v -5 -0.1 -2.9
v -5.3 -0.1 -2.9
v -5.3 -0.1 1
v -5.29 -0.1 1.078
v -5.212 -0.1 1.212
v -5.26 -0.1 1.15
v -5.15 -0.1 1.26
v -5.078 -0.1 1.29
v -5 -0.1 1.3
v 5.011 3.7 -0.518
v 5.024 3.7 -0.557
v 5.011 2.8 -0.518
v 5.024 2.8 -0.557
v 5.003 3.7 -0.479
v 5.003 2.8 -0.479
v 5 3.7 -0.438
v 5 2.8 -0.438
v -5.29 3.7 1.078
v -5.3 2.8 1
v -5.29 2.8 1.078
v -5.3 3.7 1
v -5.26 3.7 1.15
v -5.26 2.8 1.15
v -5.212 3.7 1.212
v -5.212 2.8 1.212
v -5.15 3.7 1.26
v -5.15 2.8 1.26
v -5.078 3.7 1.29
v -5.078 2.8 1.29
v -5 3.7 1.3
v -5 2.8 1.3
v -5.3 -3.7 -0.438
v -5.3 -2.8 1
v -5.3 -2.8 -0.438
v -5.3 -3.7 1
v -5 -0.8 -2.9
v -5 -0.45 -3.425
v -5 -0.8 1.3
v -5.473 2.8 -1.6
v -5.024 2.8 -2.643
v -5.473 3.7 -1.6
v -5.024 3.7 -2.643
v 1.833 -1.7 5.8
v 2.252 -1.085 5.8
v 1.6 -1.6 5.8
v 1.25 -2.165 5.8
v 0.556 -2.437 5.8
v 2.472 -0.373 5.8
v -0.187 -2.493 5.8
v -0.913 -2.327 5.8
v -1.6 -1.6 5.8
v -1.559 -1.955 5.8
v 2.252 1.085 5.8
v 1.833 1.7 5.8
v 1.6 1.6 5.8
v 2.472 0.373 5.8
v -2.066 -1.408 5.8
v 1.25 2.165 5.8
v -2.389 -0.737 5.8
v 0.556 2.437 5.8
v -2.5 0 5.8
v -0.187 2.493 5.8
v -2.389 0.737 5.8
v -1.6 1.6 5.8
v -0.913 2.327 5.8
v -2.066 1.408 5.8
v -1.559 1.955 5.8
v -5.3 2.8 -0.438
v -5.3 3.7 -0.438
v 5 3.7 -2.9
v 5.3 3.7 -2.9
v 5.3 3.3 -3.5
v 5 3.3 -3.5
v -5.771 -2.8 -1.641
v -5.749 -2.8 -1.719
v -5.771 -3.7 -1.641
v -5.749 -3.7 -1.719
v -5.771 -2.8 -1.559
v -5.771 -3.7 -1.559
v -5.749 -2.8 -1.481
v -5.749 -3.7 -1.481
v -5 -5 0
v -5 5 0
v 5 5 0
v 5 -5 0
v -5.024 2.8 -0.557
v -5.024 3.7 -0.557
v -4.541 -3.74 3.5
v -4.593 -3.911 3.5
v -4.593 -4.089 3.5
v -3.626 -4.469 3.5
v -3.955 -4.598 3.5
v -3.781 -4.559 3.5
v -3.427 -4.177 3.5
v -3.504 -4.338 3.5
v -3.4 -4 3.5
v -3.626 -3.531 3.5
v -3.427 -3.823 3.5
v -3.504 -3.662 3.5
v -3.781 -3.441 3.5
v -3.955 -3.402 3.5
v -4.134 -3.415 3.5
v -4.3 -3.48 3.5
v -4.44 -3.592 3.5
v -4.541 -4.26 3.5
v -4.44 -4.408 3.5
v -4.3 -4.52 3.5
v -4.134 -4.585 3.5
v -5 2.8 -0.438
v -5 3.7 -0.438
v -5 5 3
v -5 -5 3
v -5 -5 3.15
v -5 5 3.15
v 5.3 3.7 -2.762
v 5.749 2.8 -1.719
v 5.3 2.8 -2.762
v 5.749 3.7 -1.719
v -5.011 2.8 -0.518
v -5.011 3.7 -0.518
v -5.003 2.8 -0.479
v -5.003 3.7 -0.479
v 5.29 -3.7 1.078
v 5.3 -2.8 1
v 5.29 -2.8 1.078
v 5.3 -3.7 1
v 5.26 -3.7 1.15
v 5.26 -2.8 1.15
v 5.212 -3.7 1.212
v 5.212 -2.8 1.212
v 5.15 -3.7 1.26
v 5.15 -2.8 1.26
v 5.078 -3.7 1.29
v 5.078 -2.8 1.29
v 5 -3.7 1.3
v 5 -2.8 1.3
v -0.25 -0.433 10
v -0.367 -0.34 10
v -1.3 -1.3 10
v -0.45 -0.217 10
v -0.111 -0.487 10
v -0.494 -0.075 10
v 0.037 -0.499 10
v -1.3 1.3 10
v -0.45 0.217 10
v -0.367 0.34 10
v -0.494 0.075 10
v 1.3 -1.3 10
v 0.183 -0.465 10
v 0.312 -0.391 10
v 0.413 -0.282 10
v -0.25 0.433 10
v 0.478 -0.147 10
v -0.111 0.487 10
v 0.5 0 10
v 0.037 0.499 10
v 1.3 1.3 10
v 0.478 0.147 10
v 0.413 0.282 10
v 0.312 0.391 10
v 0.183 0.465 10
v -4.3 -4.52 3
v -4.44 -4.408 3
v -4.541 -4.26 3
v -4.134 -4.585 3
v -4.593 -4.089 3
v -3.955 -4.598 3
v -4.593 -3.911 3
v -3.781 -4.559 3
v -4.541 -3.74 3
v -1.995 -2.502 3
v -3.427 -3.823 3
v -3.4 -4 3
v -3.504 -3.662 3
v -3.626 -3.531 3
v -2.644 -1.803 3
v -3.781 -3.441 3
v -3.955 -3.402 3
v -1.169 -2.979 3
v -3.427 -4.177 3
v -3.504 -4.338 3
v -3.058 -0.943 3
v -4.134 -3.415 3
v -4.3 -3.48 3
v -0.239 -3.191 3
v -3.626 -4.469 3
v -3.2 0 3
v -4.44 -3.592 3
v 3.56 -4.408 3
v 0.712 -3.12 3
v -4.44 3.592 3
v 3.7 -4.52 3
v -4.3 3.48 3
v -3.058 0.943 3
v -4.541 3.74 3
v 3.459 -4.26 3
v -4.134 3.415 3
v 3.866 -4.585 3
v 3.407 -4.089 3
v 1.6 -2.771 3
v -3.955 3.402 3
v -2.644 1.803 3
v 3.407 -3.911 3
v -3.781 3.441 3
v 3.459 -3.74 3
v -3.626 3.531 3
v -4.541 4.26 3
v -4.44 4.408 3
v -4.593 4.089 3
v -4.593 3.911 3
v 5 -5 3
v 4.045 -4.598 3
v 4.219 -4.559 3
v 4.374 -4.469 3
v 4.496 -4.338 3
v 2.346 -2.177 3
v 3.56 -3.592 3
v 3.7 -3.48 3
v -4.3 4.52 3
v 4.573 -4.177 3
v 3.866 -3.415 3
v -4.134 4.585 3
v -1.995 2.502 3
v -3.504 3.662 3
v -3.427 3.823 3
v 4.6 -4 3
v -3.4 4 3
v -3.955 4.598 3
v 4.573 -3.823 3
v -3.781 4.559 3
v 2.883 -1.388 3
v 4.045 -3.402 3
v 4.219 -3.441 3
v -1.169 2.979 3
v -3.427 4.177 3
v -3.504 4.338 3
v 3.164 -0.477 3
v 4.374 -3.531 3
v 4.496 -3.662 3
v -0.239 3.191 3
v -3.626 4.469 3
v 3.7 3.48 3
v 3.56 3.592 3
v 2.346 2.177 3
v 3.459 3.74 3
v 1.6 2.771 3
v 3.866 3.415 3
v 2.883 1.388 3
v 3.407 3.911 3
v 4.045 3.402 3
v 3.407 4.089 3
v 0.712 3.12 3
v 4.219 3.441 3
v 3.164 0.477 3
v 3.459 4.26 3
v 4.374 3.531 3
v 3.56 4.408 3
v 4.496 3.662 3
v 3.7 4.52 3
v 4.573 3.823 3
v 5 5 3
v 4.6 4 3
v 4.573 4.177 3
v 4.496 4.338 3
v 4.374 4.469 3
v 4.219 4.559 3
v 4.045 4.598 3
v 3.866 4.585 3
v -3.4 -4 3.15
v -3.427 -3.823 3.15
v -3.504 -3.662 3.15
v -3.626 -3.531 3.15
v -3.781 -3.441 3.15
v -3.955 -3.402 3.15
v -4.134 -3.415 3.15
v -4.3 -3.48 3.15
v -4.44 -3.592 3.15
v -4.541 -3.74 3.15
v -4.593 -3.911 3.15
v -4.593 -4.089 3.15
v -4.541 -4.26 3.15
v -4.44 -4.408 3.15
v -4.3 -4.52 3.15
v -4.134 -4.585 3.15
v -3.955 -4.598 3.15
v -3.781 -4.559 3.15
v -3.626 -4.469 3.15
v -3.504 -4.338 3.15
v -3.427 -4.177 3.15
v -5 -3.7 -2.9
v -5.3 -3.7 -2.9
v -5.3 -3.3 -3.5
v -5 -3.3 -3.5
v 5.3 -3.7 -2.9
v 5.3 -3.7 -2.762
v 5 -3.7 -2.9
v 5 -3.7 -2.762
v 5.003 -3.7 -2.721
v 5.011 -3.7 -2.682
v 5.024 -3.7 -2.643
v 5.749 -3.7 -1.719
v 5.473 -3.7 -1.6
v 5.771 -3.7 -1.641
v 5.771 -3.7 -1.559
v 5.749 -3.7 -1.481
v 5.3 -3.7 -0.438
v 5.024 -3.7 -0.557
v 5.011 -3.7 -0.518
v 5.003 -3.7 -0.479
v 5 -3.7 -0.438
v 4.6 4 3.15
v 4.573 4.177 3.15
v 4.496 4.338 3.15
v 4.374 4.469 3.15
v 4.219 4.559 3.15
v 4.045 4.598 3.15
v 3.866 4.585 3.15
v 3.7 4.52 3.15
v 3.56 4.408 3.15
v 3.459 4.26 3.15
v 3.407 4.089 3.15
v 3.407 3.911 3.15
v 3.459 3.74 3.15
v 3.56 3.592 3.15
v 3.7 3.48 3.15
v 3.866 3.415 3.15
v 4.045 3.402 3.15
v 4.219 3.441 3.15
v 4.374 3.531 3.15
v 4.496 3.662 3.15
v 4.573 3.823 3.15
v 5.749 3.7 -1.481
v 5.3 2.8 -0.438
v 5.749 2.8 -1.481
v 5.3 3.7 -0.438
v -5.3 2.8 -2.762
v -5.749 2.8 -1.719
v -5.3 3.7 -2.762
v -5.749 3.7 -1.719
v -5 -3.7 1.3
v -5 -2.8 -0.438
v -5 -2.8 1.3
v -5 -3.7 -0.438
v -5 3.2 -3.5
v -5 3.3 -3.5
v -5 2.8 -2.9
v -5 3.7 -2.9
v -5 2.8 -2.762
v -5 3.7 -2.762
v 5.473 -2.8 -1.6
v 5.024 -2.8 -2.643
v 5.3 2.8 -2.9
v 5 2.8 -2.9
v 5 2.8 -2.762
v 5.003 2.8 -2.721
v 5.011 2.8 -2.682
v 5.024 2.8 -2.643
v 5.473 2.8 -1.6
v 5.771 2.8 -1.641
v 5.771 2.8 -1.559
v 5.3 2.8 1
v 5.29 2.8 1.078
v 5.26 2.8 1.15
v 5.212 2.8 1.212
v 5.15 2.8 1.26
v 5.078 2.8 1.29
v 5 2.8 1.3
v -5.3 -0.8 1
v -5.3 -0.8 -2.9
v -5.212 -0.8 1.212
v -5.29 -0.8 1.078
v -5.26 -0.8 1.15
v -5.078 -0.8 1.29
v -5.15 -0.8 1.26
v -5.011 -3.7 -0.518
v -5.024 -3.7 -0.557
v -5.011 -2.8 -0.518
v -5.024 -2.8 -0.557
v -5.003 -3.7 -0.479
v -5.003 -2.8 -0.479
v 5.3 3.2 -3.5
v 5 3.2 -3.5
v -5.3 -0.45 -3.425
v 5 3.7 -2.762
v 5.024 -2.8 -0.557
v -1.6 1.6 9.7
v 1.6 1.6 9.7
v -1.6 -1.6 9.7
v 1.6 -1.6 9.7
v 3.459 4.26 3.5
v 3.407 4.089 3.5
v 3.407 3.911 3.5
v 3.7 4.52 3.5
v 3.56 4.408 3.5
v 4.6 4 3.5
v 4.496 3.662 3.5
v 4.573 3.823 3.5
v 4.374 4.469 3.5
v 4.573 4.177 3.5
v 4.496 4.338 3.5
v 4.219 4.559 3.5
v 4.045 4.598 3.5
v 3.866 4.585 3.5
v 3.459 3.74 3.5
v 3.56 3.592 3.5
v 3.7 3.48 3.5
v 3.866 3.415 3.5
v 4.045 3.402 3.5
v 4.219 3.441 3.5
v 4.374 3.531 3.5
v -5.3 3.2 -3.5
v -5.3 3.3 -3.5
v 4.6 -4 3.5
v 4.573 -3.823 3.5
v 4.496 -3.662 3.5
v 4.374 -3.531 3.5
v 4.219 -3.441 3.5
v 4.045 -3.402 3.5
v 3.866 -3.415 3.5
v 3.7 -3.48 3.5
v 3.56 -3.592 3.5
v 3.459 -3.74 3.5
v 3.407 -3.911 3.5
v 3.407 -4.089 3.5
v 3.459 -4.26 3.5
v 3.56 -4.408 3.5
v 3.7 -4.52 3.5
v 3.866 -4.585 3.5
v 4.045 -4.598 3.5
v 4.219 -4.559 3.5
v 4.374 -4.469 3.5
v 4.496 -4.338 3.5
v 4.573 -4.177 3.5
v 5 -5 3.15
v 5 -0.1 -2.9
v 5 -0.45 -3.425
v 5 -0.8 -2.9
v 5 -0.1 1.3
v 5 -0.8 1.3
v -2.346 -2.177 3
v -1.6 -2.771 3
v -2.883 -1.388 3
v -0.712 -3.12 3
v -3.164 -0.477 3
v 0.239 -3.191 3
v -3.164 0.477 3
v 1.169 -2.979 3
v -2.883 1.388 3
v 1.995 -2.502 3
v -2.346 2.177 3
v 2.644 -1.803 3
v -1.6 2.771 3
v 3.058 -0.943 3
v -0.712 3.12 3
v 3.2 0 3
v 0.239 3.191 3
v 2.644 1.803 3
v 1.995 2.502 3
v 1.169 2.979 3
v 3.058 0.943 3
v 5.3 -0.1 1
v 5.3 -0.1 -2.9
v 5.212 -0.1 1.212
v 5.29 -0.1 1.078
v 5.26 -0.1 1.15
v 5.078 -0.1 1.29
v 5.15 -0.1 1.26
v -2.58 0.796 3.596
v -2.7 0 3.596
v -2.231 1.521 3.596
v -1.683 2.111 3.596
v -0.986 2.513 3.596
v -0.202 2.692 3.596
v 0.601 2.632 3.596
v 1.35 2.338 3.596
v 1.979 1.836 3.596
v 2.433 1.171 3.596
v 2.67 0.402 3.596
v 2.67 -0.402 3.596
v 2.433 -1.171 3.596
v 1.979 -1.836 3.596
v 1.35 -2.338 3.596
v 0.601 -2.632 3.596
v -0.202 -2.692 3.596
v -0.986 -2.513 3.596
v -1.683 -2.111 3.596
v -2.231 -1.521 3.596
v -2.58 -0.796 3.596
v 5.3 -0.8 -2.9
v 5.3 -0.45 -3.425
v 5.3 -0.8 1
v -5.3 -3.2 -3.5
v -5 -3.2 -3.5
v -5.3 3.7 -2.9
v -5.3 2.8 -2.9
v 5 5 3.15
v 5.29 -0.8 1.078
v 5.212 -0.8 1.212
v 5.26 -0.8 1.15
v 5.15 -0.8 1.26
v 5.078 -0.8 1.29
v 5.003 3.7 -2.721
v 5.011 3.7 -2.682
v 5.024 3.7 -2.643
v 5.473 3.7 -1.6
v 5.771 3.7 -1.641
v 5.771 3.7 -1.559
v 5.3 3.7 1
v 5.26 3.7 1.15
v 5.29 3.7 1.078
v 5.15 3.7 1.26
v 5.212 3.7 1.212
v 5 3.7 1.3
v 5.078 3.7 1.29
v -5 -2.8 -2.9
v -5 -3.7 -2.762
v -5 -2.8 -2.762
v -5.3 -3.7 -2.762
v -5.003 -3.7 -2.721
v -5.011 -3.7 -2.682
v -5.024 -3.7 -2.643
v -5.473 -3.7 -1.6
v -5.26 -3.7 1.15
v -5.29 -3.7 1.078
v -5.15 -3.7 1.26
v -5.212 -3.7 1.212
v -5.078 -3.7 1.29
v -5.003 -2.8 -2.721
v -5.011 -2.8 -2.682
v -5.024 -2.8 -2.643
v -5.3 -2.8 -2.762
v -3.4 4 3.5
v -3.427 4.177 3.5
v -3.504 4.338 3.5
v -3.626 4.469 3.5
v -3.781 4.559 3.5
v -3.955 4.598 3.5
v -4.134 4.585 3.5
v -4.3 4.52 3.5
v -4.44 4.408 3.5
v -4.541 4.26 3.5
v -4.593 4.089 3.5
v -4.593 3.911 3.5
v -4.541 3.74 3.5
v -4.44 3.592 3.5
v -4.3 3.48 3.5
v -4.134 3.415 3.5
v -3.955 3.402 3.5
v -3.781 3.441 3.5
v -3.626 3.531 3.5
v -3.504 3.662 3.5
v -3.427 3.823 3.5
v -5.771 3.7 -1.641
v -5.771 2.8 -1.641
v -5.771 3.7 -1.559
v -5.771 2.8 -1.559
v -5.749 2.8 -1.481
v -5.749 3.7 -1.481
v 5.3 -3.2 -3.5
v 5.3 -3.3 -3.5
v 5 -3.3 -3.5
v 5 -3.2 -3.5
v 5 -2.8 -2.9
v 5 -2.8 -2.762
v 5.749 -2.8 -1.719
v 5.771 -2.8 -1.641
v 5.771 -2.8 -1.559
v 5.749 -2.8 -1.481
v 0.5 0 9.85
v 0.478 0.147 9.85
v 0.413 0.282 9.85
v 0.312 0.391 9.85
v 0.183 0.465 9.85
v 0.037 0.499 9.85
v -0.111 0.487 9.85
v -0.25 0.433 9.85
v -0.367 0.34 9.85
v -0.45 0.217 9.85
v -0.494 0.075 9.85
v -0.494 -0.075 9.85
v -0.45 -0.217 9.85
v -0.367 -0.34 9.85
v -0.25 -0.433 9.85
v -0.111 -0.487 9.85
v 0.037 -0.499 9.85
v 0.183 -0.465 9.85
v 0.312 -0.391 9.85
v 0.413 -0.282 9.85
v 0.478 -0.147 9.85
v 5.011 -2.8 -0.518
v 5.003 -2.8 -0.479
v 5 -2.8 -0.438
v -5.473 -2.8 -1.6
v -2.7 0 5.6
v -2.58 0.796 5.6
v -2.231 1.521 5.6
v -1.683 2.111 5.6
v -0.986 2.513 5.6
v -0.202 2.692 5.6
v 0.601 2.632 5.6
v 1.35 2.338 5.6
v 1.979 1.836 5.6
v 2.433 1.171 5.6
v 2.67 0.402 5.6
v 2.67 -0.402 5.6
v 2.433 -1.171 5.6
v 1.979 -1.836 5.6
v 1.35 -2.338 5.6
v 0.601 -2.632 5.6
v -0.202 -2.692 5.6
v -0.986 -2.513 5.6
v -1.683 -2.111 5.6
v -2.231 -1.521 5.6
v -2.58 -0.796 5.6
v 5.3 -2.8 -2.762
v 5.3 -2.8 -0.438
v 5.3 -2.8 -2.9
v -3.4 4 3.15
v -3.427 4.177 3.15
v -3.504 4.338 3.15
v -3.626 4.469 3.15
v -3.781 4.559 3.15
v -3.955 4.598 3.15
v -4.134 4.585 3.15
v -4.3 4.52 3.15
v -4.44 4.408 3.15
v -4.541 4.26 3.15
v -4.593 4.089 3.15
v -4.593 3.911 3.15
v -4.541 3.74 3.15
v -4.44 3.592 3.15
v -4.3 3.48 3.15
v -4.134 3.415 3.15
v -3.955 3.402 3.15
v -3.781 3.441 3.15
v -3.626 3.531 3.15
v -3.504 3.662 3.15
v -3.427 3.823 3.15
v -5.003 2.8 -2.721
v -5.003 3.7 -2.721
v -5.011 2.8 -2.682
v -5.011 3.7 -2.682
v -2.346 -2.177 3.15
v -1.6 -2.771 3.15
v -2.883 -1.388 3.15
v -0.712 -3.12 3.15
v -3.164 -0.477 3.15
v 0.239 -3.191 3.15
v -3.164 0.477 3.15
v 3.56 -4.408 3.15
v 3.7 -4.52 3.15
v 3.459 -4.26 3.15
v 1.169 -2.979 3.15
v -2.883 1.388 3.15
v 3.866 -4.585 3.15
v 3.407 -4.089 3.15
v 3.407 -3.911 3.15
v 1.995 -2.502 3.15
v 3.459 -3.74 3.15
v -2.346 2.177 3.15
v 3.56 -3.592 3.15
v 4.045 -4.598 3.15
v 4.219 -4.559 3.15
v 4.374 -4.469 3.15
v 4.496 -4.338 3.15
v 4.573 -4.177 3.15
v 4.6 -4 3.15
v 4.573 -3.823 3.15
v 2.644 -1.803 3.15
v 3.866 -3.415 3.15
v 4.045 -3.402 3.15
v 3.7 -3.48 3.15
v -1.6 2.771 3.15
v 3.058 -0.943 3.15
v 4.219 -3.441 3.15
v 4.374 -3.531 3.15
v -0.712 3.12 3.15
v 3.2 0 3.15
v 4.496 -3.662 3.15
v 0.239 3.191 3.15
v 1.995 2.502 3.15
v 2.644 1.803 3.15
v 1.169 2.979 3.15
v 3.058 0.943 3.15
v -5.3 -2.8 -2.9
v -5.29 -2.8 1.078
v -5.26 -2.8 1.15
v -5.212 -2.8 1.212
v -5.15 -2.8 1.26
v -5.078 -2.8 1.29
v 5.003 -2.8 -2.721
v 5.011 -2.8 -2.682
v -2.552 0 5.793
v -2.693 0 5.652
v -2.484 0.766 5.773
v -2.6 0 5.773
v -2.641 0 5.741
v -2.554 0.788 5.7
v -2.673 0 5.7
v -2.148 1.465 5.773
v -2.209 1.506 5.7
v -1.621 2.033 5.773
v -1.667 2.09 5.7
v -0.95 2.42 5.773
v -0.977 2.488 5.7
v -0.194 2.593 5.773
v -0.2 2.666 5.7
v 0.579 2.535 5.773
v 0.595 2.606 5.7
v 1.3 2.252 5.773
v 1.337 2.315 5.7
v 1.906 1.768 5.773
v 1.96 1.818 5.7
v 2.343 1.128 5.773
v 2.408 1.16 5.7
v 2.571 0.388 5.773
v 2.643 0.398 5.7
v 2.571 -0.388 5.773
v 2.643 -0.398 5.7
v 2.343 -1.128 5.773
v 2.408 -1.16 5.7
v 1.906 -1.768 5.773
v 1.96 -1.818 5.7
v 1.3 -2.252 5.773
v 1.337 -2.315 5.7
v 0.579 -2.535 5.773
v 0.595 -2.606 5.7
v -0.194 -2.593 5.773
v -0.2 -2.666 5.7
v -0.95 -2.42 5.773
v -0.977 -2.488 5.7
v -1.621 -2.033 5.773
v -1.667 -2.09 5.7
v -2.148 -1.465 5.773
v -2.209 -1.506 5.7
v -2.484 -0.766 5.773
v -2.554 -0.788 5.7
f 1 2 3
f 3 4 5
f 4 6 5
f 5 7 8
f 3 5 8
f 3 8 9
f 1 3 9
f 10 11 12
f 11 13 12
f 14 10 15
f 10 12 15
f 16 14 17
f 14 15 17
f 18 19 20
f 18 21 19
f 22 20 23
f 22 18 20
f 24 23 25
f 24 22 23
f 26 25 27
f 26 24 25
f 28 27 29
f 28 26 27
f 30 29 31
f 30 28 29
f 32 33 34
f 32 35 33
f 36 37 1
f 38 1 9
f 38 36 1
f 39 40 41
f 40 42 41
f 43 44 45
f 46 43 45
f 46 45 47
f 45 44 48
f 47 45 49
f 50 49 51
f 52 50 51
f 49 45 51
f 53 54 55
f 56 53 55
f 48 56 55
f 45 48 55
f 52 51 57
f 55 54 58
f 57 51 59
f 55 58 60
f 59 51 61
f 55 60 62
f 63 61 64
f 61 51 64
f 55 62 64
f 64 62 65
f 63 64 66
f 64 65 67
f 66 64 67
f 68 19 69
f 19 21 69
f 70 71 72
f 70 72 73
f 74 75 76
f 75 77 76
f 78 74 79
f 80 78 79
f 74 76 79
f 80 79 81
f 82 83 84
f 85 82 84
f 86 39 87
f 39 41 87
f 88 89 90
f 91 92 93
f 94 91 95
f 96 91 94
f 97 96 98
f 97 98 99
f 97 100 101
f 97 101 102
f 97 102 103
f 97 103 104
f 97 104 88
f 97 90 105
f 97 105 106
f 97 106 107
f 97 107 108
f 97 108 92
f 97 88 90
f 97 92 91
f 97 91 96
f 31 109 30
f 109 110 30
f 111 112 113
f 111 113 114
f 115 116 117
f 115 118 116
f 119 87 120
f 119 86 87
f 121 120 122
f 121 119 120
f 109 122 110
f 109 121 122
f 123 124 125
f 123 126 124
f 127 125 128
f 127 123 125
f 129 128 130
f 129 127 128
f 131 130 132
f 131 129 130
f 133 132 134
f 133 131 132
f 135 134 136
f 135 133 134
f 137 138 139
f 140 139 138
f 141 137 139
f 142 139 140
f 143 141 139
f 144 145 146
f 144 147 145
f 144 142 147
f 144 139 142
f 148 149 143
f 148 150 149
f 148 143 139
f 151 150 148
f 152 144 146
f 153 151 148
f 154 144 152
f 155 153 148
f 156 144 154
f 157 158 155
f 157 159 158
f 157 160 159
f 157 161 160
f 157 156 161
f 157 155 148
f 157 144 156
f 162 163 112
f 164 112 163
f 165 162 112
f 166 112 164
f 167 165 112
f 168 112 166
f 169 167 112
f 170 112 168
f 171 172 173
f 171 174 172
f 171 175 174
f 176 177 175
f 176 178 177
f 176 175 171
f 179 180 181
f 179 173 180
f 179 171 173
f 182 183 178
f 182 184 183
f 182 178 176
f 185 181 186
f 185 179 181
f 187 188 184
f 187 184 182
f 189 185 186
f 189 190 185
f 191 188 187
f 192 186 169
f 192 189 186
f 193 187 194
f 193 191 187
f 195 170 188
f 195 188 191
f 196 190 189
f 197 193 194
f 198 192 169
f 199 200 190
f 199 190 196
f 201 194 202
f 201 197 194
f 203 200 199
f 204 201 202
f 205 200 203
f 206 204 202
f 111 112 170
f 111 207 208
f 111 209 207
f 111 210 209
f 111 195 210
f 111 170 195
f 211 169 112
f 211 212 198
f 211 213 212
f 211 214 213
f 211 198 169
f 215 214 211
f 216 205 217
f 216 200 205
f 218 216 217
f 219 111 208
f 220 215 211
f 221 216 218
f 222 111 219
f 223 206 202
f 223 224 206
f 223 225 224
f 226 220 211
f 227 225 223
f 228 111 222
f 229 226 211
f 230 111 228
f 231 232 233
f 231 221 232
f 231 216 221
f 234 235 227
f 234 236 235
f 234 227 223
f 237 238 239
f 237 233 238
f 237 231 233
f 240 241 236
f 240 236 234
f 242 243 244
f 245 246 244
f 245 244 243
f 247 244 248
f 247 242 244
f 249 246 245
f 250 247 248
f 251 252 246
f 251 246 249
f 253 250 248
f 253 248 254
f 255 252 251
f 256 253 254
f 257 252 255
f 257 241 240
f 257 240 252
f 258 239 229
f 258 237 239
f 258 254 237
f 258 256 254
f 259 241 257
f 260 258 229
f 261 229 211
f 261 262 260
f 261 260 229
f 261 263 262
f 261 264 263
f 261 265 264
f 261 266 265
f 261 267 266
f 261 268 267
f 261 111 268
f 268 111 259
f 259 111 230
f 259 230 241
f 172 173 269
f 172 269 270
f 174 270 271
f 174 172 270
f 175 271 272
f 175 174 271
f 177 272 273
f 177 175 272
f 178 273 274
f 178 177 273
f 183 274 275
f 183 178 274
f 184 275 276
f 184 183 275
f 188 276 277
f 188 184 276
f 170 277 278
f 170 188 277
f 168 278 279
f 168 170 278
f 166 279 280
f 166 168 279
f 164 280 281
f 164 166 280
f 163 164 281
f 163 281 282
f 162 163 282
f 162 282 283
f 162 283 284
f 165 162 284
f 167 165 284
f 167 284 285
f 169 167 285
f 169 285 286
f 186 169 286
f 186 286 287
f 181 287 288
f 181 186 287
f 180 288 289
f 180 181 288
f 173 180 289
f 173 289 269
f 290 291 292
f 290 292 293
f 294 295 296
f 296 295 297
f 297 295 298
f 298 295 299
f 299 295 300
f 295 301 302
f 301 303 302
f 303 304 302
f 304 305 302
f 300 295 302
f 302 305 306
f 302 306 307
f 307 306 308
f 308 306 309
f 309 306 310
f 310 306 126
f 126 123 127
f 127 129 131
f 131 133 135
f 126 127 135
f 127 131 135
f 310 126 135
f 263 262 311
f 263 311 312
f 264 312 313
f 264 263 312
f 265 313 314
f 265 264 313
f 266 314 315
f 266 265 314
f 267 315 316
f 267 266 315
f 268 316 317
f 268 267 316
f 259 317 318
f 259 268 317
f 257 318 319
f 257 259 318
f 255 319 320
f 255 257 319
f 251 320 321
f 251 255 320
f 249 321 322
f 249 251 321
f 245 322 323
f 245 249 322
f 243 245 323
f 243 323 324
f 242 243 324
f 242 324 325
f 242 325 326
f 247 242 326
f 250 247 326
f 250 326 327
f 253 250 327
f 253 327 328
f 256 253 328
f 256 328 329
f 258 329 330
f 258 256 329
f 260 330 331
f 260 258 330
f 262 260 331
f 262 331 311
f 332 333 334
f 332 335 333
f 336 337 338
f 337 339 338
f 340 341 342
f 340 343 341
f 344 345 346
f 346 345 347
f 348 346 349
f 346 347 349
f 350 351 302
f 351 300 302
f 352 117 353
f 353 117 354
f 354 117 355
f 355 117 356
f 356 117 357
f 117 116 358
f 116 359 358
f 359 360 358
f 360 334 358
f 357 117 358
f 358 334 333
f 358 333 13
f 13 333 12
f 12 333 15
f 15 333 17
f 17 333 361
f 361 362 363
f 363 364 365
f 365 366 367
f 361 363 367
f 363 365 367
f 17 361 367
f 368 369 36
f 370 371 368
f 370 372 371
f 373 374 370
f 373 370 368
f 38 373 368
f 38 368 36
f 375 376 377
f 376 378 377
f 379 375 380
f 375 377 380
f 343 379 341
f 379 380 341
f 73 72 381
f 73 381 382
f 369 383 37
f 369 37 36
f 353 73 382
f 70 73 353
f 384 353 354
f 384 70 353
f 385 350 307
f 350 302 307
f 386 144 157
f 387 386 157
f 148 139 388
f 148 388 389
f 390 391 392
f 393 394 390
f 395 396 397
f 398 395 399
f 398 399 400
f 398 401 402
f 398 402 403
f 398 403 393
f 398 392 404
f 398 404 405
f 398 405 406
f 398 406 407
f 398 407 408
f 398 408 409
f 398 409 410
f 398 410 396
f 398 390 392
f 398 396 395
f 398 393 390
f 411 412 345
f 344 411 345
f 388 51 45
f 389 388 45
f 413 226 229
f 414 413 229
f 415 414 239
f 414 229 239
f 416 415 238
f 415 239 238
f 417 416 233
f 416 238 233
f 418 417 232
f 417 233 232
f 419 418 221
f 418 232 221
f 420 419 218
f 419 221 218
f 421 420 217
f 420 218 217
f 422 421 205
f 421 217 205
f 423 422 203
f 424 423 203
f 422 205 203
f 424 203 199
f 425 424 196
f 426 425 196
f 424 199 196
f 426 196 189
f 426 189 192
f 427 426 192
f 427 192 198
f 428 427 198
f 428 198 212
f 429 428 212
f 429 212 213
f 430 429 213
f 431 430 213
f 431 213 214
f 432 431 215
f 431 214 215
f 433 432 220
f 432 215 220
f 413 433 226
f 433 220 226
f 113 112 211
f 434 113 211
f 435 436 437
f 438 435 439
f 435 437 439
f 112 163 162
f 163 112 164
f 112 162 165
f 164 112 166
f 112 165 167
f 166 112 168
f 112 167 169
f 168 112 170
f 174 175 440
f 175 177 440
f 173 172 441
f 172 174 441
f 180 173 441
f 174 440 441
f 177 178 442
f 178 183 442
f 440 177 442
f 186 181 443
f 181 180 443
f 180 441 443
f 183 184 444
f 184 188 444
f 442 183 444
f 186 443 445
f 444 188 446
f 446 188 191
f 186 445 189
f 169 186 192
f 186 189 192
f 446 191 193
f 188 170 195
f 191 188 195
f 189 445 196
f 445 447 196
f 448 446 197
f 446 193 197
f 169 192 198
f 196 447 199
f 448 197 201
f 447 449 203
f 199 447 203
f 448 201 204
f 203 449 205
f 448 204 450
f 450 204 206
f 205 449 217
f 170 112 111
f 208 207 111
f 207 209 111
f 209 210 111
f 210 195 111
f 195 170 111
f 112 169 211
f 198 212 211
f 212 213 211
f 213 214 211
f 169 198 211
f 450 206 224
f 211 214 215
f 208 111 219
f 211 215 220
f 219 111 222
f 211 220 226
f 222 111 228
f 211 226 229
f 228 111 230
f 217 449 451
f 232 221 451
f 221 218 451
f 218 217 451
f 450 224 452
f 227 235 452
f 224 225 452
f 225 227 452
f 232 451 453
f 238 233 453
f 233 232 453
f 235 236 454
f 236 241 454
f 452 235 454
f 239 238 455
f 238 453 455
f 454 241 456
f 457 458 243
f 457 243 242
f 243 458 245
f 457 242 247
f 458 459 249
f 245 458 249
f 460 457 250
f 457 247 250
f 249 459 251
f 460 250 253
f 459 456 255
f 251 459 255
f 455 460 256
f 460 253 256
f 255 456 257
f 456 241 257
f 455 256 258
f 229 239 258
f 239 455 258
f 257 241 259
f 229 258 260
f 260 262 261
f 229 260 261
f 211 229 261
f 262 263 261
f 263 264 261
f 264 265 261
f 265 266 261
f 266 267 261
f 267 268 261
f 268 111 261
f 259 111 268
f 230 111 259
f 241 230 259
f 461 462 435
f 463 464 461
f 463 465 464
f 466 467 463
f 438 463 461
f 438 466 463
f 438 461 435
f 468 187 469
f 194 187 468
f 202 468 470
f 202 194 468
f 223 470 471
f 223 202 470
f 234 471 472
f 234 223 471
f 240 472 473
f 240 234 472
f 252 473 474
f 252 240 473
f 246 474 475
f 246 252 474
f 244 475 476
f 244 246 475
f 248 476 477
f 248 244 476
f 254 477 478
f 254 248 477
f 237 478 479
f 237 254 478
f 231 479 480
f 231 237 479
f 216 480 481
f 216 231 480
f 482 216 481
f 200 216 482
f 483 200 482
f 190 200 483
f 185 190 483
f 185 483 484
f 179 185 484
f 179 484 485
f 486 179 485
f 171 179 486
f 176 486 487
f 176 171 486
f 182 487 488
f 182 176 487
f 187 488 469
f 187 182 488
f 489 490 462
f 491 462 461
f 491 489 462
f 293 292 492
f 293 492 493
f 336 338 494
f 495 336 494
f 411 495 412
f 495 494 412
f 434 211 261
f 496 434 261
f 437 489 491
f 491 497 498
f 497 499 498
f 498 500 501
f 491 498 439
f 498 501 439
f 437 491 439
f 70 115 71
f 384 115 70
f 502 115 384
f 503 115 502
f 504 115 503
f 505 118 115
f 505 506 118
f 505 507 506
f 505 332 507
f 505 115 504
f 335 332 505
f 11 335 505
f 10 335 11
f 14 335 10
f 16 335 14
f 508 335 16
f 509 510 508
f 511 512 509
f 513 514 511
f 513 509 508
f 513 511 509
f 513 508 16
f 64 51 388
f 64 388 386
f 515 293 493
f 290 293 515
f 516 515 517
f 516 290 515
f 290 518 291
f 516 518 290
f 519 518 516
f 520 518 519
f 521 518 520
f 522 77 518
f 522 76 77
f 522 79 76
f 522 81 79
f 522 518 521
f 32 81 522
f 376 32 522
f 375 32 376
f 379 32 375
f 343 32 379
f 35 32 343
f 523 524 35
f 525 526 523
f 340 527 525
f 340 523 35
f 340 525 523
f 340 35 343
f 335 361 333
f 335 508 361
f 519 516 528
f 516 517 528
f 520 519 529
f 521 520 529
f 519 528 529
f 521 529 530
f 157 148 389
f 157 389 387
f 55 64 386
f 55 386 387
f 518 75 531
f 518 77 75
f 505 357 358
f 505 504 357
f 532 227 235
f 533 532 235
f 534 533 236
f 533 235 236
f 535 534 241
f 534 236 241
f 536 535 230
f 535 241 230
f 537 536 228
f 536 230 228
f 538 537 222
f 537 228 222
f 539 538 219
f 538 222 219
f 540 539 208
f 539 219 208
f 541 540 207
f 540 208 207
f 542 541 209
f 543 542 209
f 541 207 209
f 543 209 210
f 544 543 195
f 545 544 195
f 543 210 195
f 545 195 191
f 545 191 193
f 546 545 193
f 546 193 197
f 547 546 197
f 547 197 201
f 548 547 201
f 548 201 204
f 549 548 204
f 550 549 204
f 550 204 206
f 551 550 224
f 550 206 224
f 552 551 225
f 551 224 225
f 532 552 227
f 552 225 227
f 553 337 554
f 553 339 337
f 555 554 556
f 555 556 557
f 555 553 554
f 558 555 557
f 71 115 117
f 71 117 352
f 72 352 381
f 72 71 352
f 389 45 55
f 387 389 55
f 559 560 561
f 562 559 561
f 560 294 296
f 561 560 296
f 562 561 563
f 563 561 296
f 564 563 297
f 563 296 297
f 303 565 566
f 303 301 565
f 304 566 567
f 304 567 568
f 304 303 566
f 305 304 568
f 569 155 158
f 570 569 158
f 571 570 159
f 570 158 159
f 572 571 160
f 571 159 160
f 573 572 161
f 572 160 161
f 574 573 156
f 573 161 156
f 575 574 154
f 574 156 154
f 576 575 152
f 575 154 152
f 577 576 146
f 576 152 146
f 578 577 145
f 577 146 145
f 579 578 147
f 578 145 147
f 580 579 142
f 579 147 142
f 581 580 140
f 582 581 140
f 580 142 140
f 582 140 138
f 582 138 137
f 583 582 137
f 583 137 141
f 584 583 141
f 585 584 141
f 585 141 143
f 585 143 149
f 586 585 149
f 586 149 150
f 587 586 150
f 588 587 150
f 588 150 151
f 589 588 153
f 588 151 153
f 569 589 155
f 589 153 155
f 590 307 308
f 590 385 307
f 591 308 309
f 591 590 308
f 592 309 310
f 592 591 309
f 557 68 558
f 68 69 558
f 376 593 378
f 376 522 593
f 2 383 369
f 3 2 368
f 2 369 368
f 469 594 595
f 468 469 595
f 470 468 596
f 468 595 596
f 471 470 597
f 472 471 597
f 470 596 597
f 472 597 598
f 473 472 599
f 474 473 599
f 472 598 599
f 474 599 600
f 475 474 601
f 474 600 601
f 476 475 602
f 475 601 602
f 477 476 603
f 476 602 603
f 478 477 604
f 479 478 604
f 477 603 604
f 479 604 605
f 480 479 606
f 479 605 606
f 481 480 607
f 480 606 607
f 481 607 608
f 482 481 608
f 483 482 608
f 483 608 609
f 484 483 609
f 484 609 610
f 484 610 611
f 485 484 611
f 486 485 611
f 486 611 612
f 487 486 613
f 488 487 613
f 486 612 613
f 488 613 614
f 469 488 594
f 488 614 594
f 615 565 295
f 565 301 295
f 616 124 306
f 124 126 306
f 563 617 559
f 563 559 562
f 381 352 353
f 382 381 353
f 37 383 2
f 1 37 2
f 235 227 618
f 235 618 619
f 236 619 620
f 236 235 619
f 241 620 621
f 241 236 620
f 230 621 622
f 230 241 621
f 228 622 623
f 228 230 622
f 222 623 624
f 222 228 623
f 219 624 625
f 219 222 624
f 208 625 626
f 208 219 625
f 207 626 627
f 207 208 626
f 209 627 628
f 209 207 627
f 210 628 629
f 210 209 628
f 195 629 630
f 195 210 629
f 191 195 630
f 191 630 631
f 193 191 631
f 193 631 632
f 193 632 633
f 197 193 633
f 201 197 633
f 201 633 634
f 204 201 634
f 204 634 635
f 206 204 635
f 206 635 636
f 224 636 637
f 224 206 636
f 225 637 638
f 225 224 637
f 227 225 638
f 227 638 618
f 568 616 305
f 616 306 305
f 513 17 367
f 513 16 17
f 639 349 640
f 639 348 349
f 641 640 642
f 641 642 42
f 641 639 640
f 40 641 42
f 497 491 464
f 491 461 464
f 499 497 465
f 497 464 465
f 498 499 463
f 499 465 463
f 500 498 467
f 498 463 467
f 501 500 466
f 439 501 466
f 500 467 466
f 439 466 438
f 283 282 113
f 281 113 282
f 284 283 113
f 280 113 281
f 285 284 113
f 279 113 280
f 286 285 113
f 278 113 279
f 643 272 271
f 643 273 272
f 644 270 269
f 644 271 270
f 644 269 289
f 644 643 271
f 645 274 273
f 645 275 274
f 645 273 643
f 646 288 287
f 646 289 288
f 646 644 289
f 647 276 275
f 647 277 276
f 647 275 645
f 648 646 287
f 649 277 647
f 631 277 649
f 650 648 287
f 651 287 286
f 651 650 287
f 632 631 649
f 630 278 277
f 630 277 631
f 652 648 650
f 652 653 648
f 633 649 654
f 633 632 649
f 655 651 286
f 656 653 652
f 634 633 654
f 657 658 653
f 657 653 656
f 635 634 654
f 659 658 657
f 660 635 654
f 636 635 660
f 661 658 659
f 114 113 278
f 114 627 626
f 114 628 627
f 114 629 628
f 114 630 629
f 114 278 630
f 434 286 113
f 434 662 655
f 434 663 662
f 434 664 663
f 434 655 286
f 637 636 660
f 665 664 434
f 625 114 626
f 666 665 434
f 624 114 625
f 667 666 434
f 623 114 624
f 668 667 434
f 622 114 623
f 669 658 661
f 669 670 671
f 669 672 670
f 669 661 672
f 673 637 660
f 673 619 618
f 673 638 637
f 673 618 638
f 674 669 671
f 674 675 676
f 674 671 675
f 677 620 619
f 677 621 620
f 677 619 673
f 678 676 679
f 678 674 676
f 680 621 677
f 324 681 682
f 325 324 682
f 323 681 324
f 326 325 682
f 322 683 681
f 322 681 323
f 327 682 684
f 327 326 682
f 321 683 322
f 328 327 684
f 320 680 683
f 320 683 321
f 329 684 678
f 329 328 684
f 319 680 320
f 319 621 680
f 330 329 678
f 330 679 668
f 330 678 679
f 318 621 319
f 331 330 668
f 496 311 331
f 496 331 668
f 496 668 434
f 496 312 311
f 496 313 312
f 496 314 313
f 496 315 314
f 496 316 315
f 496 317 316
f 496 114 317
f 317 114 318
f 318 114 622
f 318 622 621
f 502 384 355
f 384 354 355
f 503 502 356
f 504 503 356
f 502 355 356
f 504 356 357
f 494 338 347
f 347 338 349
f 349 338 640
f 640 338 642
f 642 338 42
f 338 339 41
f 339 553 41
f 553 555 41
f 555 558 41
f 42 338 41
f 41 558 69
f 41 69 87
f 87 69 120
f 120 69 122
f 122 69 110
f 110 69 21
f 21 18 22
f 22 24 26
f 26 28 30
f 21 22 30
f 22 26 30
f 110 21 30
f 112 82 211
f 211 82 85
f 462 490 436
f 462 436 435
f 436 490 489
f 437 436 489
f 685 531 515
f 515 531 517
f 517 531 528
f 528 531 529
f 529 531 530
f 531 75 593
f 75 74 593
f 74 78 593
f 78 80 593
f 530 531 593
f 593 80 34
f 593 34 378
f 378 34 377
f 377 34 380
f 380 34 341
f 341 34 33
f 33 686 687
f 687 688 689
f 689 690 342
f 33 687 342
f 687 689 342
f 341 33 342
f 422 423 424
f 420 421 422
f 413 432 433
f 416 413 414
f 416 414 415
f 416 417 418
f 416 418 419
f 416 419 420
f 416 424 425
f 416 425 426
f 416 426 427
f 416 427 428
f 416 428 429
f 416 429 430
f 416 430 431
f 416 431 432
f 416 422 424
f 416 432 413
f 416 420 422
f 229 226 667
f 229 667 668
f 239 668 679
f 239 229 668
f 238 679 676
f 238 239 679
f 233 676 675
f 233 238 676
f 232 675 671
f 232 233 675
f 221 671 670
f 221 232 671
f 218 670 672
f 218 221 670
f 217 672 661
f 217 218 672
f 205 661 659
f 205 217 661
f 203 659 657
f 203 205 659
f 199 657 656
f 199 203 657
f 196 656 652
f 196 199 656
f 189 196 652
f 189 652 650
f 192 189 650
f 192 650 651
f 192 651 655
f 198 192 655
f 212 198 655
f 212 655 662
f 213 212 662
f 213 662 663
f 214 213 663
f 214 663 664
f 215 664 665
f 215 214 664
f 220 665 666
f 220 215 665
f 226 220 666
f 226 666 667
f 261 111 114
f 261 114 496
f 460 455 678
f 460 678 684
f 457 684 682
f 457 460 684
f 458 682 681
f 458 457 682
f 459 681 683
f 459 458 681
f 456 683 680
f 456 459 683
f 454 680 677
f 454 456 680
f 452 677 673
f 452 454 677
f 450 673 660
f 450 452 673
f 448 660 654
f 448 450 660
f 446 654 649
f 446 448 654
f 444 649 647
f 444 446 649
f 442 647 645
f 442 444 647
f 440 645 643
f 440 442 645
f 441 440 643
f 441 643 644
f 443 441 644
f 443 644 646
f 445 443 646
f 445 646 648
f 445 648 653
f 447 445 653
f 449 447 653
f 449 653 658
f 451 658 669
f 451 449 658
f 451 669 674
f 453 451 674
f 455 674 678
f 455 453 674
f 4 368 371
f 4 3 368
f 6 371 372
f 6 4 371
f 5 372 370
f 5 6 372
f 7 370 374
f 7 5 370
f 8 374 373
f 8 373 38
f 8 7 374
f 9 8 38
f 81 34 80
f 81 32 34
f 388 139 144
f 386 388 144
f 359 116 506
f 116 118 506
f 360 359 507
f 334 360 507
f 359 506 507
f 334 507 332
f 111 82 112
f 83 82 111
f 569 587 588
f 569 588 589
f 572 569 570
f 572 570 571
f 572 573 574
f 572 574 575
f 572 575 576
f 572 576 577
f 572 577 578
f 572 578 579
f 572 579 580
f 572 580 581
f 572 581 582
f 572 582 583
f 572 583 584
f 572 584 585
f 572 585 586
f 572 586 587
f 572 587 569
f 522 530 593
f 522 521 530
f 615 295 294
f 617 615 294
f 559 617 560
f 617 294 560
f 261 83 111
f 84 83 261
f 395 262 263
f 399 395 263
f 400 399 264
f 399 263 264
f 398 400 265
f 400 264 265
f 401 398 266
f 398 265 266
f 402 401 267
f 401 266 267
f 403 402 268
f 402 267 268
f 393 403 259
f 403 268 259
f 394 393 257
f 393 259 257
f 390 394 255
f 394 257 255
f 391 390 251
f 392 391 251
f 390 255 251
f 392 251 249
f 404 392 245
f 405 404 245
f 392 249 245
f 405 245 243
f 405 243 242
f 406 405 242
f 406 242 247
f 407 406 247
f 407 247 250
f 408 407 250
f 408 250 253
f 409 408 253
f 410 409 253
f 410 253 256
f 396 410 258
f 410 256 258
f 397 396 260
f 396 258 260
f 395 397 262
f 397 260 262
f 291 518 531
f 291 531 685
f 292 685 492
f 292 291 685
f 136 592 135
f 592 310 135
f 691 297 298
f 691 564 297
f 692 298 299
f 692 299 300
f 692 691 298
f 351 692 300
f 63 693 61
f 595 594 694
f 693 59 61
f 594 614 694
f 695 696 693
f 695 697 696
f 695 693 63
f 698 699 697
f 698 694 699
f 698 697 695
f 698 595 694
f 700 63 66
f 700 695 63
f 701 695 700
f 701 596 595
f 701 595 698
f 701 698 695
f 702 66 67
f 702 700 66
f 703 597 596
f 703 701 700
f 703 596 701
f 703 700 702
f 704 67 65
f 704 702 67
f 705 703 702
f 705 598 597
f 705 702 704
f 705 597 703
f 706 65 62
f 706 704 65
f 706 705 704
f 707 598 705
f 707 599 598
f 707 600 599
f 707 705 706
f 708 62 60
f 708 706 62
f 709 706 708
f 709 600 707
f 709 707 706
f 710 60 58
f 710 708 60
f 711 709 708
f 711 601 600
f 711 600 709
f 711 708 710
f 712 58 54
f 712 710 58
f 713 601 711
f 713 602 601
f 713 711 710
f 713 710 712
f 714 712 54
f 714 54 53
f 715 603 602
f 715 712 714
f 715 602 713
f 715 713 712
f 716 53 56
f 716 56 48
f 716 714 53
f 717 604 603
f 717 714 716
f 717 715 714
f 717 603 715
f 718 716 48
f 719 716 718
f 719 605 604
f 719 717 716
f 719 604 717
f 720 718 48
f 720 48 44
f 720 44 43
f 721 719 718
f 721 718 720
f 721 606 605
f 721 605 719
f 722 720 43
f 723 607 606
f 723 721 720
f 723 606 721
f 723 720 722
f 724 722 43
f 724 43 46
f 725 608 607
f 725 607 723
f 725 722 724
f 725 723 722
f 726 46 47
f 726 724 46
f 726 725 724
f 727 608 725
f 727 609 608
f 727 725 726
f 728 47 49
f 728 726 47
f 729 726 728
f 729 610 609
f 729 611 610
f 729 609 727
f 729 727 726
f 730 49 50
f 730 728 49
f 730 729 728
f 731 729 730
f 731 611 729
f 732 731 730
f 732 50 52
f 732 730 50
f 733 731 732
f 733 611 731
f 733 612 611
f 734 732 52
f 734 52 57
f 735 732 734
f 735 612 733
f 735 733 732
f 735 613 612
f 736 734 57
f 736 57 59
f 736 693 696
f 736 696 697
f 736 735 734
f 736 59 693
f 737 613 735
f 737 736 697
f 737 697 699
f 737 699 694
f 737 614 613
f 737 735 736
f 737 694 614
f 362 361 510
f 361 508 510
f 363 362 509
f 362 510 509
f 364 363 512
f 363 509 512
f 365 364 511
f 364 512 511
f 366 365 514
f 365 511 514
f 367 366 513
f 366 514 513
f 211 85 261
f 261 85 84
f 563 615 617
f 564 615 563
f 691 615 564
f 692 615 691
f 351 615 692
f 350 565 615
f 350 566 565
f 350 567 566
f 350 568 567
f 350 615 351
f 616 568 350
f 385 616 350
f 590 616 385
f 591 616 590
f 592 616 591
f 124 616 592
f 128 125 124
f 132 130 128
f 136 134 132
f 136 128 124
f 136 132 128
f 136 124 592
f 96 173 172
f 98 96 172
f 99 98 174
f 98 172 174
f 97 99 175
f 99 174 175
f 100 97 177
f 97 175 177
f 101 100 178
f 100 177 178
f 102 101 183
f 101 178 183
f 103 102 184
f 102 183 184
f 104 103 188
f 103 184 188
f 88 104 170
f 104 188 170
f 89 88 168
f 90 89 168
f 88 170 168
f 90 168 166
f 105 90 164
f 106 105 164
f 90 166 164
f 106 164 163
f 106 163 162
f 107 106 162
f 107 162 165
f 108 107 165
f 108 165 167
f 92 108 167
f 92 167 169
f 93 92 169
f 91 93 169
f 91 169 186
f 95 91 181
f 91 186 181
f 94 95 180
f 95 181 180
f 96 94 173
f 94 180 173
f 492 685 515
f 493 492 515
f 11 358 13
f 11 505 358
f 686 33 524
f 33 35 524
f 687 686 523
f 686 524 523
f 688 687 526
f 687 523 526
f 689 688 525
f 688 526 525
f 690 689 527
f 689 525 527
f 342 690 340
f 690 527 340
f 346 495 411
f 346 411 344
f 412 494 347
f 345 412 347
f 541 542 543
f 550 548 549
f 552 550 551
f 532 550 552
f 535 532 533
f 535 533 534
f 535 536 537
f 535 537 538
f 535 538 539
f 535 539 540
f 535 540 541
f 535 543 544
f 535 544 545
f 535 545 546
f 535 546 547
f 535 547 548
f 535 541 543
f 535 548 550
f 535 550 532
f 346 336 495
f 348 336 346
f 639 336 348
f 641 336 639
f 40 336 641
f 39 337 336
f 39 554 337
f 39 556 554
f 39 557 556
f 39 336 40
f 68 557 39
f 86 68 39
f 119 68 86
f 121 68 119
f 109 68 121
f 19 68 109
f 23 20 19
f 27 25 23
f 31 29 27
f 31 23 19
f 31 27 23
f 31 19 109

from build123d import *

# Parameters (mm, degrees)
F0_W           = 10
F0_H           = 10
F1_DEPTH       = 3
F2_W           = 10
F2_H           = 10
F2_R           = 0.6
F2_R_2         = 3.2
F3_DEPTH       = 0.15
F4_DEPTH       = 0.5
F5_W           = 2.7
F5_H           = 2.2041232037
F7_W           = 3.2
F7_H           = 3.2
F8_DEPTH       = 4.2
F9_R           = 0.5
F10_DEPTH      = 0.15
F11_SIZE       = 0.3
F12_R          = 0.2
F15_DEPTH      = 0.45
F17_W          = 0.3
F17_H          = 4.8
F18_DEPTH      = 0.35
F19_C1_SIZE2   = 0.6
F19_C1_SIZE    = 0.4
F19_C2_SIZE2   = 0.6
F19_C2_SIZE    = 0.4
F19_2_T1_DEPTH = 3.4005606286
F20_R          = 0.29999
F20_2_R        = 0.29999


# Not quite as in the source:
# - a fillet or chamfer that OpenCascade refuses, or shapes differently, is made with other operations: its cross-section is extruded or revolved along the edge and cut away or added
# - a fillet or chamfer is up to 0.001 mm smaller than in the source, because OpenCascade refuses the exact size


with BuildPart() as f1:
    # F0 (on Top) → F1 (new body)
    with BuildSketch(Plane.XY):
        Rectangle(F0_W, F0_H)
    extrude(amount=F1_DEPTH)

    # F2 (on face) → F4 (join)
    with BuildSketch(Plane.XY.offset(3)):
        with Locations((-4, 4)):
            Circle(F2_R)
        with Locations((4, -4)):
            Circle(F2_R)
        with Locations((4, 4)):
            Circle(F2_R)
        with Locations((-4, -4)):
            Circle(F2_R)
    extrude(amount=F4_DEPTH)

    # F5 (on Front) → F6 (revolve)
    with BuildSketch(Plane.XZ):
        Polygon((-3.2, 3), (0, 3), (0, 3.5958767963), (-2.7, 3.5958767963), align=None)
        with Locations((-1.35, 4.6979383981)):
            Rectangle(F5_W, F5_H)
    revolve(axis=Axis((0, 0, 4.6979383981), (0, 0, -1)))

    # F7 (on face) → F8 (join)
    with BuildSketch(Plane.XY.offset(5.8)):
        Rectangle(F7_W, F7_H)
    extrude(amount=F8_DEPTH)

    # F9 (on face) → F10 (cut)
    with BuildSketch(Plane.XY.offset(10)):
        Circle(F9_R)
    extrude(amount=-F10_DEPTH, mode=Mode.SUBTRACT)

    # F11
    f11_edges = [f1.edges().sort_by_distance(p)[0] for p in [
        (-1.6, 0, 10),
        (0, -1.6, 10),
        (1.6, 0, 10),
        (0, 1.6, 10),
    ]]
    chamfer(f11_edges, length=F11_SIZE)

    # F12
    f12_edges = [f1.edges().sort_by_distance(p)[0] for p in [
        (2.7, 0, 5.8),
    ]]
    fillet(f12_edges, radius=F12_R)


with BuildPart() as f3:
    # F2 (on face) → F3 (new body)
    with BuildSketch(Plane.XY.offset(3)):
        Rectangle(F2_W, F2_H)
        with Locations((-4, -4)):
            Circle(F2_R, mode=Mode.SUBTRACT)
        with Locations((4, -4)):
            Circle(F2_R, mode=Mode.SUBTRACT)
        with Locations((-4, 4)):
            Circle(F2_R, mode=Mode.SUBTRACT)
        Circle(F2_R_2, mode=Mode.SUBTRACT)
        with Locations((4, 4)):
            Circle(F2_R, mode=Mode.SUBTRACT)
    extrude(amount=F3_DEPTH)


with BuildPart() as f15:
    # F14 (on offset) → F15 (new body, symmetric)
    with BuildSketch(Plane.XZ.offset(3.25)):
        Polygon((-5, -0.5), (-5, 1.3), (-5.3, 1.3), (-5.3, -0.4381863865), (-5.8, -1.6), (-5.3, -2.7618136135), (-5.3, -3.5), (-5, -3.5), (-5, -2.7), (-5.4733977926, -1.6), align=None)
    extrude(amount=F15_DEPTH, both=True)

    # F19: chamfer of 0.4 x 0.6 on 2 edges, made by hand

    # F19_c1
    f19_c1_edges = [f15.edges().sort_by_distance(p)[0] for p in [
        (-5.15, -2.8, -3.5),
    ]]
    f19_c1_side = f15.faces().sort_by_distance((-5.15, -2.808, -3.5))[0]
    chamfer(f19_c1_edges, length=F19_C1_SIZE, length2=F19_C1_SIZE2, reference=f19_c1_side)

    # F19_c2
    f19_c2_edges = [f15.edges().sort_by_distance(p)[0] for p in [
        (-5.15, -3.7, -3.5),
    ]]
    f19_c2_side = f15.faces().sort_by_distance((-5.15, -3.692, -3.5))[0]
    chamfer(f19_c2_edges, length=F19_C2_SIZE, length2=F19_C2_SIZE2, reference=f19_c2_side)

    # F20 (radius 0.3 in the source; OpenCascade refuses exactly that, so slightly less here)
    f20_edges = [f15.edges().sort_by_distance(p)[0] for p in [
        (-5.8, -3.25, -1.6),
        (-5.3, -3.25, 1.3),
        (-5, -3.25, -2.7),
        (-5, -3.25, -0.5),
    ]]
    fillet(f20_edges, radius=F20_R)


with BuildPart() as f18:
    # F17 (on offset) → F18 (new body, symmetric)
    with BuildSketch(Plane.XZ.offset(0.45)):
        with Locations((-5.15, -1.1)):
            Rectangle(F17_W, F17_H)
    extrude(amount=F18_DEPTH, both=True)

    # F19#2: chamfer of 0.4 x 0.6 on 2 edges, made by hand

    # F19_2_s2 → F19_2_t1 (cut)
    with BuildSketch(Plane.YZ.offset(-6.8502803143)):
        Polygon((-0.4, -3.5), (-0.8, -2.9), (-0.8, -3.5), align=None)
        Polygon((-0.5, -3.5), (-0.1, -2.9), (-0.1, -3.5), align=None)
    extrude(amount=F19_2_T1_DEPTH, mode=Mode.SUBTRACT)

    # F20#2 (radius 0.3 in the source; OpenCascade refuses exactly that, so slightly less here)
    f20_2_edges = [f18.edges().sort_by_distance(p)[0] for p in [
        (-5.3, -0.45, 1.3),
    ]]
    fillet(f20_2_edges, radius=F20_2_R)


with BuildPart() as f21_1:
    # F21: instance of F15
    add(f15.part.mirror(Plane.XZ))


with BuildPart() as f22_1:
    # F22: instance of F21_1
    add(f21_1.part.mirror(Plane.YZ))


with BuildPart() as f22_2:
    # F22: instance of F15
    add(f15.part.mirror(Plane.YZ))


with BuildPart() as f22_3:
    # F22: instance of F18
    add(f18.part.mirror(Plane.YZ))


solid = Compound([f1.part, f3.part, f15.part, f18.part, f21_1.part, f22_1.part, f22_2.part, f22_3.part])
